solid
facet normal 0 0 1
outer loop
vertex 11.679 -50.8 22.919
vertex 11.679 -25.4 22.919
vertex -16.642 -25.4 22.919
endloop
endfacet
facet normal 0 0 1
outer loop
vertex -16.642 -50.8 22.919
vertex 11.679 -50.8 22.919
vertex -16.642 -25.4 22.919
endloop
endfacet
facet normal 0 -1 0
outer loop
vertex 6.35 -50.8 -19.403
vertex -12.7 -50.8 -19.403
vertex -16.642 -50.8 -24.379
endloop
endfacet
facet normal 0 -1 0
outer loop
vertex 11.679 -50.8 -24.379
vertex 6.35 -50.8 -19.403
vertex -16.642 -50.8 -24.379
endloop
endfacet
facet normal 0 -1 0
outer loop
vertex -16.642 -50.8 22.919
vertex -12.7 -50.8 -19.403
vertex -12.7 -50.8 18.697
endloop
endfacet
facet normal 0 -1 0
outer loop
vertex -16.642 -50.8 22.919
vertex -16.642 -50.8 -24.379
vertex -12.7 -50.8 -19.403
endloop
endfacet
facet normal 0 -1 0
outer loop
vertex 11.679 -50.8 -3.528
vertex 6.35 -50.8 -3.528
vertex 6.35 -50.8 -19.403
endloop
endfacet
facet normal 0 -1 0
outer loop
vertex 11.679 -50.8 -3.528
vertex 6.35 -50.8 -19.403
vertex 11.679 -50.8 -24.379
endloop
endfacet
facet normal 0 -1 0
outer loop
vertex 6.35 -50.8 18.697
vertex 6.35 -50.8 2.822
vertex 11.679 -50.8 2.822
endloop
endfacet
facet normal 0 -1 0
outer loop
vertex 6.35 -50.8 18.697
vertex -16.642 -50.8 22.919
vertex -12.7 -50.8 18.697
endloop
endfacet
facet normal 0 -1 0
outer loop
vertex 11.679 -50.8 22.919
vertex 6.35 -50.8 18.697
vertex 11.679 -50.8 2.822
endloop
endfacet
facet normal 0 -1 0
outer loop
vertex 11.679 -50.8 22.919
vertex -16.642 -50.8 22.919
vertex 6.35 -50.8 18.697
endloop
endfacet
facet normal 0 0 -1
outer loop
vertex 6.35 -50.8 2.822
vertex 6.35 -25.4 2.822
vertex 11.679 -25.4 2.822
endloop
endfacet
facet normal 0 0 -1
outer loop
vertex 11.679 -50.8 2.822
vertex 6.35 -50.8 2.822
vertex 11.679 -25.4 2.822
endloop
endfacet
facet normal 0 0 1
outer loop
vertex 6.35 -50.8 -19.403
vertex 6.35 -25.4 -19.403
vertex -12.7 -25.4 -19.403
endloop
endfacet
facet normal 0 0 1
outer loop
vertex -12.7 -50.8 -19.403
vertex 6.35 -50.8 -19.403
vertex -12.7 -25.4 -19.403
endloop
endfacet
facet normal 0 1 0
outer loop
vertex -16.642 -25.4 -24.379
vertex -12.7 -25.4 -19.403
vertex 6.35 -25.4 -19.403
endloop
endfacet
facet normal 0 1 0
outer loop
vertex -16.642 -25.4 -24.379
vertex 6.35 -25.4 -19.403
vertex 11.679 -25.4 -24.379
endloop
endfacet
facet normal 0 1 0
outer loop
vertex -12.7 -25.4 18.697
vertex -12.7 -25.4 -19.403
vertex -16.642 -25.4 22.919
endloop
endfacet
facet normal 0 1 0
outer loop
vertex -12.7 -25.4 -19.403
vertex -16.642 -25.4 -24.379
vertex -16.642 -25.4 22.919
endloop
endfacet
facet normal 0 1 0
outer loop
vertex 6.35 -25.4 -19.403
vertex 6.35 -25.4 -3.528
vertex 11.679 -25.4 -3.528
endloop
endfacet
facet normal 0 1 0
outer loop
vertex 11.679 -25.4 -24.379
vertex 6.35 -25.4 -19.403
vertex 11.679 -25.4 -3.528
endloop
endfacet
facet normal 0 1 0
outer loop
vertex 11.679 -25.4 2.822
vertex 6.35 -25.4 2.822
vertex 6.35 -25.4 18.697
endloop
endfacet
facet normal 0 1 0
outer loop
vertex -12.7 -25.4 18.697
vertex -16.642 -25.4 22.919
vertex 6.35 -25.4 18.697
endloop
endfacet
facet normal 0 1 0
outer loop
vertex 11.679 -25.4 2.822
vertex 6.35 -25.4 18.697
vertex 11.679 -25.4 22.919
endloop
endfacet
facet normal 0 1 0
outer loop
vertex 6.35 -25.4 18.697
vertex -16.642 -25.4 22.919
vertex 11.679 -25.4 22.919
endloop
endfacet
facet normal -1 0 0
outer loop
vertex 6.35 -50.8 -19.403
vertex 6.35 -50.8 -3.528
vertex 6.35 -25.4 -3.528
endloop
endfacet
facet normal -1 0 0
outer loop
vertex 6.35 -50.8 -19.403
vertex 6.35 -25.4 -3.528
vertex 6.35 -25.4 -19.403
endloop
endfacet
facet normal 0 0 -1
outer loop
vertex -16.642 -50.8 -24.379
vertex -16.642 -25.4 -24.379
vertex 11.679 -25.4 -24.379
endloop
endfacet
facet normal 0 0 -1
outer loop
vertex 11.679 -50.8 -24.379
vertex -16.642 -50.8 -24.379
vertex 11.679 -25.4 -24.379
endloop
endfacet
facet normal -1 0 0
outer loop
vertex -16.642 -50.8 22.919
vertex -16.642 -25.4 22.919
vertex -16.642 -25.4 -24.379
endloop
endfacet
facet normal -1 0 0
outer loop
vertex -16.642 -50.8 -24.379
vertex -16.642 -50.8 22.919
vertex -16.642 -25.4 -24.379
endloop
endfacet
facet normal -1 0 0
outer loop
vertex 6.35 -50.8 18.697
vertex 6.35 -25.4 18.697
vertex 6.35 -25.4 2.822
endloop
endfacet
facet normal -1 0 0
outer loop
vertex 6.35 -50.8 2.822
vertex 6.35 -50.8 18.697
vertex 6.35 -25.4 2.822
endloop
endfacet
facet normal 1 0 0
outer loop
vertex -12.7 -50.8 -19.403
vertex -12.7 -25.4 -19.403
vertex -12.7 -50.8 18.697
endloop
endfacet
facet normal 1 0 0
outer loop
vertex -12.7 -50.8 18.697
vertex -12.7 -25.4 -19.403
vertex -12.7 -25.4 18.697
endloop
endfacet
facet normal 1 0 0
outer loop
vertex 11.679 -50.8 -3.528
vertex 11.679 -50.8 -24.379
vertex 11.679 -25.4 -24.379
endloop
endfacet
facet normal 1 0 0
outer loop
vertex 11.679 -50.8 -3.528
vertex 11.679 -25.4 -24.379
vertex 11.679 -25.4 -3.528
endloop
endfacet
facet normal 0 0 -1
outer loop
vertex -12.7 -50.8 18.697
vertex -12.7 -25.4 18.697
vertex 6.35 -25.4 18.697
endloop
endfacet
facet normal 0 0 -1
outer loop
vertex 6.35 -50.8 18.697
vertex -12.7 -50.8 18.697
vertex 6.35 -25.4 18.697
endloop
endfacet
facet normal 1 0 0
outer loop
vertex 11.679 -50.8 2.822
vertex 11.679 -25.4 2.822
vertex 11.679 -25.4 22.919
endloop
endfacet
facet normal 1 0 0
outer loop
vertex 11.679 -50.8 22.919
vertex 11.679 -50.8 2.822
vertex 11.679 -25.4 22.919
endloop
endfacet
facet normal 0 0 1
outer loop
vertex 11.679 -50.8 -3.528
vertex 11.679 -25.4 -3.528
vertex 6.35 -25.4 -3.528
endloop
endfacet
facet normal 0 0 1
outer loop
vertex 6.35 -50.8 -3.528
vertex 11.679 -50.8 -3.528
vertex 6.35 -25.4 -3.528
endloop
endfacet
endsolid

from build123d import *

# Parameters (mm, degrees)
F2_DEPTH = 25.4


with BuildPart() as f2:
    # F1 (on offset) → F2 (new body)
    with BuildSketch(Plane.XZ.offset(25.4)):
        Polygon((-12.7, -19.402778), (-12.7, 18.697222), (6.35, 18.697222), (6.35, 2.822222), (11.678541, 2.822222), (11.678541, 22.919137), (-16.641926, 22.919137), (-16.641926, -24.378963), (11.678541, -24.378963), (11.678541, -3.527778), (6.35, -3.527778), (6.35, -19.402778), align=None)
    extrude(amount=F2_DEPTH)


solid = f2.part
